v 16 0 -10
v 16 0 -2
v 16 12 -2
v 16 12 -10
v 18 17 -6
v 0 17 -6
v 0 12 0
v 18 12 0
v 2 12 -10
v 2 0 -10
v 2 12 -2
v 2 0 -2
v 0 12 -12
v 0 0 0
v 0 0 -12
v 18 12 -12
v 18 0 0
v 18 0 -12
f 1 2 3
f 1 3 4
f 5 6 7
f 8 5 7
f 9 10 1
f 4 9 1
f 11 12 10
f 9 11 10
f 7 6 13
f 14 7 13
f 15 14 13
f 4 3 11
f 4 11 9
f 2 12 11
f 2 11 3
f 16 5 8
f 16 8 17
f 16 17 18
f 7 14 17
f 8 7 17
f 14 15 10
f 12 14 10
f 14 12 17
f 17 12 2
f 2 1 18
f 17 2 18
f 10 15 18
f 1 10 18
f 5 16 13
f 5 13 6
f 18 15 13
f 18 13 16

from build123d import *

# Parameters (mm, degrees)
SKETCH1_W           = 18
SKETCH1_H           = 12
SKETCH1_W_2         = 14
SKETCH1_H_2         = 8
BOSS_EXTRUDE1_DEPTH = 12
BOSS_EXTRUDE2_DEPTH = 18


with BuildPart() as part:
    # Sketch1 → Boss-Extrude1 (new body)
    with BuildSketch(Plane(origin=(0, 0, 0), x_dir=(1, 0, 0), z_dir=(0, 1, 0))):
        with Locations((9, 6)):
            Rectangle(SKETCH1_W, SKETCH1_H)
        with Locations((9, 6)):
            Rectangle(SKETCH1_W_2, SKETCH1_H_2, mode=Mode.SUBTRACT)
    extrude(amount=BOSS_EXTRUDE1_DEPTH)

    # Sketch2 → Boss-Extrude2 (add)
    with BuildSketch(Plane(origin=(18, 0, 0), x_dir=(0, 0, -1), z_dir=(1, 0, 0))):
        Polygon((6, 17), (0, 12), (12, 12), align=None)
    extrude(amount=-BOSS_EXTRUDE2_DEPTH)


solid = part.part
